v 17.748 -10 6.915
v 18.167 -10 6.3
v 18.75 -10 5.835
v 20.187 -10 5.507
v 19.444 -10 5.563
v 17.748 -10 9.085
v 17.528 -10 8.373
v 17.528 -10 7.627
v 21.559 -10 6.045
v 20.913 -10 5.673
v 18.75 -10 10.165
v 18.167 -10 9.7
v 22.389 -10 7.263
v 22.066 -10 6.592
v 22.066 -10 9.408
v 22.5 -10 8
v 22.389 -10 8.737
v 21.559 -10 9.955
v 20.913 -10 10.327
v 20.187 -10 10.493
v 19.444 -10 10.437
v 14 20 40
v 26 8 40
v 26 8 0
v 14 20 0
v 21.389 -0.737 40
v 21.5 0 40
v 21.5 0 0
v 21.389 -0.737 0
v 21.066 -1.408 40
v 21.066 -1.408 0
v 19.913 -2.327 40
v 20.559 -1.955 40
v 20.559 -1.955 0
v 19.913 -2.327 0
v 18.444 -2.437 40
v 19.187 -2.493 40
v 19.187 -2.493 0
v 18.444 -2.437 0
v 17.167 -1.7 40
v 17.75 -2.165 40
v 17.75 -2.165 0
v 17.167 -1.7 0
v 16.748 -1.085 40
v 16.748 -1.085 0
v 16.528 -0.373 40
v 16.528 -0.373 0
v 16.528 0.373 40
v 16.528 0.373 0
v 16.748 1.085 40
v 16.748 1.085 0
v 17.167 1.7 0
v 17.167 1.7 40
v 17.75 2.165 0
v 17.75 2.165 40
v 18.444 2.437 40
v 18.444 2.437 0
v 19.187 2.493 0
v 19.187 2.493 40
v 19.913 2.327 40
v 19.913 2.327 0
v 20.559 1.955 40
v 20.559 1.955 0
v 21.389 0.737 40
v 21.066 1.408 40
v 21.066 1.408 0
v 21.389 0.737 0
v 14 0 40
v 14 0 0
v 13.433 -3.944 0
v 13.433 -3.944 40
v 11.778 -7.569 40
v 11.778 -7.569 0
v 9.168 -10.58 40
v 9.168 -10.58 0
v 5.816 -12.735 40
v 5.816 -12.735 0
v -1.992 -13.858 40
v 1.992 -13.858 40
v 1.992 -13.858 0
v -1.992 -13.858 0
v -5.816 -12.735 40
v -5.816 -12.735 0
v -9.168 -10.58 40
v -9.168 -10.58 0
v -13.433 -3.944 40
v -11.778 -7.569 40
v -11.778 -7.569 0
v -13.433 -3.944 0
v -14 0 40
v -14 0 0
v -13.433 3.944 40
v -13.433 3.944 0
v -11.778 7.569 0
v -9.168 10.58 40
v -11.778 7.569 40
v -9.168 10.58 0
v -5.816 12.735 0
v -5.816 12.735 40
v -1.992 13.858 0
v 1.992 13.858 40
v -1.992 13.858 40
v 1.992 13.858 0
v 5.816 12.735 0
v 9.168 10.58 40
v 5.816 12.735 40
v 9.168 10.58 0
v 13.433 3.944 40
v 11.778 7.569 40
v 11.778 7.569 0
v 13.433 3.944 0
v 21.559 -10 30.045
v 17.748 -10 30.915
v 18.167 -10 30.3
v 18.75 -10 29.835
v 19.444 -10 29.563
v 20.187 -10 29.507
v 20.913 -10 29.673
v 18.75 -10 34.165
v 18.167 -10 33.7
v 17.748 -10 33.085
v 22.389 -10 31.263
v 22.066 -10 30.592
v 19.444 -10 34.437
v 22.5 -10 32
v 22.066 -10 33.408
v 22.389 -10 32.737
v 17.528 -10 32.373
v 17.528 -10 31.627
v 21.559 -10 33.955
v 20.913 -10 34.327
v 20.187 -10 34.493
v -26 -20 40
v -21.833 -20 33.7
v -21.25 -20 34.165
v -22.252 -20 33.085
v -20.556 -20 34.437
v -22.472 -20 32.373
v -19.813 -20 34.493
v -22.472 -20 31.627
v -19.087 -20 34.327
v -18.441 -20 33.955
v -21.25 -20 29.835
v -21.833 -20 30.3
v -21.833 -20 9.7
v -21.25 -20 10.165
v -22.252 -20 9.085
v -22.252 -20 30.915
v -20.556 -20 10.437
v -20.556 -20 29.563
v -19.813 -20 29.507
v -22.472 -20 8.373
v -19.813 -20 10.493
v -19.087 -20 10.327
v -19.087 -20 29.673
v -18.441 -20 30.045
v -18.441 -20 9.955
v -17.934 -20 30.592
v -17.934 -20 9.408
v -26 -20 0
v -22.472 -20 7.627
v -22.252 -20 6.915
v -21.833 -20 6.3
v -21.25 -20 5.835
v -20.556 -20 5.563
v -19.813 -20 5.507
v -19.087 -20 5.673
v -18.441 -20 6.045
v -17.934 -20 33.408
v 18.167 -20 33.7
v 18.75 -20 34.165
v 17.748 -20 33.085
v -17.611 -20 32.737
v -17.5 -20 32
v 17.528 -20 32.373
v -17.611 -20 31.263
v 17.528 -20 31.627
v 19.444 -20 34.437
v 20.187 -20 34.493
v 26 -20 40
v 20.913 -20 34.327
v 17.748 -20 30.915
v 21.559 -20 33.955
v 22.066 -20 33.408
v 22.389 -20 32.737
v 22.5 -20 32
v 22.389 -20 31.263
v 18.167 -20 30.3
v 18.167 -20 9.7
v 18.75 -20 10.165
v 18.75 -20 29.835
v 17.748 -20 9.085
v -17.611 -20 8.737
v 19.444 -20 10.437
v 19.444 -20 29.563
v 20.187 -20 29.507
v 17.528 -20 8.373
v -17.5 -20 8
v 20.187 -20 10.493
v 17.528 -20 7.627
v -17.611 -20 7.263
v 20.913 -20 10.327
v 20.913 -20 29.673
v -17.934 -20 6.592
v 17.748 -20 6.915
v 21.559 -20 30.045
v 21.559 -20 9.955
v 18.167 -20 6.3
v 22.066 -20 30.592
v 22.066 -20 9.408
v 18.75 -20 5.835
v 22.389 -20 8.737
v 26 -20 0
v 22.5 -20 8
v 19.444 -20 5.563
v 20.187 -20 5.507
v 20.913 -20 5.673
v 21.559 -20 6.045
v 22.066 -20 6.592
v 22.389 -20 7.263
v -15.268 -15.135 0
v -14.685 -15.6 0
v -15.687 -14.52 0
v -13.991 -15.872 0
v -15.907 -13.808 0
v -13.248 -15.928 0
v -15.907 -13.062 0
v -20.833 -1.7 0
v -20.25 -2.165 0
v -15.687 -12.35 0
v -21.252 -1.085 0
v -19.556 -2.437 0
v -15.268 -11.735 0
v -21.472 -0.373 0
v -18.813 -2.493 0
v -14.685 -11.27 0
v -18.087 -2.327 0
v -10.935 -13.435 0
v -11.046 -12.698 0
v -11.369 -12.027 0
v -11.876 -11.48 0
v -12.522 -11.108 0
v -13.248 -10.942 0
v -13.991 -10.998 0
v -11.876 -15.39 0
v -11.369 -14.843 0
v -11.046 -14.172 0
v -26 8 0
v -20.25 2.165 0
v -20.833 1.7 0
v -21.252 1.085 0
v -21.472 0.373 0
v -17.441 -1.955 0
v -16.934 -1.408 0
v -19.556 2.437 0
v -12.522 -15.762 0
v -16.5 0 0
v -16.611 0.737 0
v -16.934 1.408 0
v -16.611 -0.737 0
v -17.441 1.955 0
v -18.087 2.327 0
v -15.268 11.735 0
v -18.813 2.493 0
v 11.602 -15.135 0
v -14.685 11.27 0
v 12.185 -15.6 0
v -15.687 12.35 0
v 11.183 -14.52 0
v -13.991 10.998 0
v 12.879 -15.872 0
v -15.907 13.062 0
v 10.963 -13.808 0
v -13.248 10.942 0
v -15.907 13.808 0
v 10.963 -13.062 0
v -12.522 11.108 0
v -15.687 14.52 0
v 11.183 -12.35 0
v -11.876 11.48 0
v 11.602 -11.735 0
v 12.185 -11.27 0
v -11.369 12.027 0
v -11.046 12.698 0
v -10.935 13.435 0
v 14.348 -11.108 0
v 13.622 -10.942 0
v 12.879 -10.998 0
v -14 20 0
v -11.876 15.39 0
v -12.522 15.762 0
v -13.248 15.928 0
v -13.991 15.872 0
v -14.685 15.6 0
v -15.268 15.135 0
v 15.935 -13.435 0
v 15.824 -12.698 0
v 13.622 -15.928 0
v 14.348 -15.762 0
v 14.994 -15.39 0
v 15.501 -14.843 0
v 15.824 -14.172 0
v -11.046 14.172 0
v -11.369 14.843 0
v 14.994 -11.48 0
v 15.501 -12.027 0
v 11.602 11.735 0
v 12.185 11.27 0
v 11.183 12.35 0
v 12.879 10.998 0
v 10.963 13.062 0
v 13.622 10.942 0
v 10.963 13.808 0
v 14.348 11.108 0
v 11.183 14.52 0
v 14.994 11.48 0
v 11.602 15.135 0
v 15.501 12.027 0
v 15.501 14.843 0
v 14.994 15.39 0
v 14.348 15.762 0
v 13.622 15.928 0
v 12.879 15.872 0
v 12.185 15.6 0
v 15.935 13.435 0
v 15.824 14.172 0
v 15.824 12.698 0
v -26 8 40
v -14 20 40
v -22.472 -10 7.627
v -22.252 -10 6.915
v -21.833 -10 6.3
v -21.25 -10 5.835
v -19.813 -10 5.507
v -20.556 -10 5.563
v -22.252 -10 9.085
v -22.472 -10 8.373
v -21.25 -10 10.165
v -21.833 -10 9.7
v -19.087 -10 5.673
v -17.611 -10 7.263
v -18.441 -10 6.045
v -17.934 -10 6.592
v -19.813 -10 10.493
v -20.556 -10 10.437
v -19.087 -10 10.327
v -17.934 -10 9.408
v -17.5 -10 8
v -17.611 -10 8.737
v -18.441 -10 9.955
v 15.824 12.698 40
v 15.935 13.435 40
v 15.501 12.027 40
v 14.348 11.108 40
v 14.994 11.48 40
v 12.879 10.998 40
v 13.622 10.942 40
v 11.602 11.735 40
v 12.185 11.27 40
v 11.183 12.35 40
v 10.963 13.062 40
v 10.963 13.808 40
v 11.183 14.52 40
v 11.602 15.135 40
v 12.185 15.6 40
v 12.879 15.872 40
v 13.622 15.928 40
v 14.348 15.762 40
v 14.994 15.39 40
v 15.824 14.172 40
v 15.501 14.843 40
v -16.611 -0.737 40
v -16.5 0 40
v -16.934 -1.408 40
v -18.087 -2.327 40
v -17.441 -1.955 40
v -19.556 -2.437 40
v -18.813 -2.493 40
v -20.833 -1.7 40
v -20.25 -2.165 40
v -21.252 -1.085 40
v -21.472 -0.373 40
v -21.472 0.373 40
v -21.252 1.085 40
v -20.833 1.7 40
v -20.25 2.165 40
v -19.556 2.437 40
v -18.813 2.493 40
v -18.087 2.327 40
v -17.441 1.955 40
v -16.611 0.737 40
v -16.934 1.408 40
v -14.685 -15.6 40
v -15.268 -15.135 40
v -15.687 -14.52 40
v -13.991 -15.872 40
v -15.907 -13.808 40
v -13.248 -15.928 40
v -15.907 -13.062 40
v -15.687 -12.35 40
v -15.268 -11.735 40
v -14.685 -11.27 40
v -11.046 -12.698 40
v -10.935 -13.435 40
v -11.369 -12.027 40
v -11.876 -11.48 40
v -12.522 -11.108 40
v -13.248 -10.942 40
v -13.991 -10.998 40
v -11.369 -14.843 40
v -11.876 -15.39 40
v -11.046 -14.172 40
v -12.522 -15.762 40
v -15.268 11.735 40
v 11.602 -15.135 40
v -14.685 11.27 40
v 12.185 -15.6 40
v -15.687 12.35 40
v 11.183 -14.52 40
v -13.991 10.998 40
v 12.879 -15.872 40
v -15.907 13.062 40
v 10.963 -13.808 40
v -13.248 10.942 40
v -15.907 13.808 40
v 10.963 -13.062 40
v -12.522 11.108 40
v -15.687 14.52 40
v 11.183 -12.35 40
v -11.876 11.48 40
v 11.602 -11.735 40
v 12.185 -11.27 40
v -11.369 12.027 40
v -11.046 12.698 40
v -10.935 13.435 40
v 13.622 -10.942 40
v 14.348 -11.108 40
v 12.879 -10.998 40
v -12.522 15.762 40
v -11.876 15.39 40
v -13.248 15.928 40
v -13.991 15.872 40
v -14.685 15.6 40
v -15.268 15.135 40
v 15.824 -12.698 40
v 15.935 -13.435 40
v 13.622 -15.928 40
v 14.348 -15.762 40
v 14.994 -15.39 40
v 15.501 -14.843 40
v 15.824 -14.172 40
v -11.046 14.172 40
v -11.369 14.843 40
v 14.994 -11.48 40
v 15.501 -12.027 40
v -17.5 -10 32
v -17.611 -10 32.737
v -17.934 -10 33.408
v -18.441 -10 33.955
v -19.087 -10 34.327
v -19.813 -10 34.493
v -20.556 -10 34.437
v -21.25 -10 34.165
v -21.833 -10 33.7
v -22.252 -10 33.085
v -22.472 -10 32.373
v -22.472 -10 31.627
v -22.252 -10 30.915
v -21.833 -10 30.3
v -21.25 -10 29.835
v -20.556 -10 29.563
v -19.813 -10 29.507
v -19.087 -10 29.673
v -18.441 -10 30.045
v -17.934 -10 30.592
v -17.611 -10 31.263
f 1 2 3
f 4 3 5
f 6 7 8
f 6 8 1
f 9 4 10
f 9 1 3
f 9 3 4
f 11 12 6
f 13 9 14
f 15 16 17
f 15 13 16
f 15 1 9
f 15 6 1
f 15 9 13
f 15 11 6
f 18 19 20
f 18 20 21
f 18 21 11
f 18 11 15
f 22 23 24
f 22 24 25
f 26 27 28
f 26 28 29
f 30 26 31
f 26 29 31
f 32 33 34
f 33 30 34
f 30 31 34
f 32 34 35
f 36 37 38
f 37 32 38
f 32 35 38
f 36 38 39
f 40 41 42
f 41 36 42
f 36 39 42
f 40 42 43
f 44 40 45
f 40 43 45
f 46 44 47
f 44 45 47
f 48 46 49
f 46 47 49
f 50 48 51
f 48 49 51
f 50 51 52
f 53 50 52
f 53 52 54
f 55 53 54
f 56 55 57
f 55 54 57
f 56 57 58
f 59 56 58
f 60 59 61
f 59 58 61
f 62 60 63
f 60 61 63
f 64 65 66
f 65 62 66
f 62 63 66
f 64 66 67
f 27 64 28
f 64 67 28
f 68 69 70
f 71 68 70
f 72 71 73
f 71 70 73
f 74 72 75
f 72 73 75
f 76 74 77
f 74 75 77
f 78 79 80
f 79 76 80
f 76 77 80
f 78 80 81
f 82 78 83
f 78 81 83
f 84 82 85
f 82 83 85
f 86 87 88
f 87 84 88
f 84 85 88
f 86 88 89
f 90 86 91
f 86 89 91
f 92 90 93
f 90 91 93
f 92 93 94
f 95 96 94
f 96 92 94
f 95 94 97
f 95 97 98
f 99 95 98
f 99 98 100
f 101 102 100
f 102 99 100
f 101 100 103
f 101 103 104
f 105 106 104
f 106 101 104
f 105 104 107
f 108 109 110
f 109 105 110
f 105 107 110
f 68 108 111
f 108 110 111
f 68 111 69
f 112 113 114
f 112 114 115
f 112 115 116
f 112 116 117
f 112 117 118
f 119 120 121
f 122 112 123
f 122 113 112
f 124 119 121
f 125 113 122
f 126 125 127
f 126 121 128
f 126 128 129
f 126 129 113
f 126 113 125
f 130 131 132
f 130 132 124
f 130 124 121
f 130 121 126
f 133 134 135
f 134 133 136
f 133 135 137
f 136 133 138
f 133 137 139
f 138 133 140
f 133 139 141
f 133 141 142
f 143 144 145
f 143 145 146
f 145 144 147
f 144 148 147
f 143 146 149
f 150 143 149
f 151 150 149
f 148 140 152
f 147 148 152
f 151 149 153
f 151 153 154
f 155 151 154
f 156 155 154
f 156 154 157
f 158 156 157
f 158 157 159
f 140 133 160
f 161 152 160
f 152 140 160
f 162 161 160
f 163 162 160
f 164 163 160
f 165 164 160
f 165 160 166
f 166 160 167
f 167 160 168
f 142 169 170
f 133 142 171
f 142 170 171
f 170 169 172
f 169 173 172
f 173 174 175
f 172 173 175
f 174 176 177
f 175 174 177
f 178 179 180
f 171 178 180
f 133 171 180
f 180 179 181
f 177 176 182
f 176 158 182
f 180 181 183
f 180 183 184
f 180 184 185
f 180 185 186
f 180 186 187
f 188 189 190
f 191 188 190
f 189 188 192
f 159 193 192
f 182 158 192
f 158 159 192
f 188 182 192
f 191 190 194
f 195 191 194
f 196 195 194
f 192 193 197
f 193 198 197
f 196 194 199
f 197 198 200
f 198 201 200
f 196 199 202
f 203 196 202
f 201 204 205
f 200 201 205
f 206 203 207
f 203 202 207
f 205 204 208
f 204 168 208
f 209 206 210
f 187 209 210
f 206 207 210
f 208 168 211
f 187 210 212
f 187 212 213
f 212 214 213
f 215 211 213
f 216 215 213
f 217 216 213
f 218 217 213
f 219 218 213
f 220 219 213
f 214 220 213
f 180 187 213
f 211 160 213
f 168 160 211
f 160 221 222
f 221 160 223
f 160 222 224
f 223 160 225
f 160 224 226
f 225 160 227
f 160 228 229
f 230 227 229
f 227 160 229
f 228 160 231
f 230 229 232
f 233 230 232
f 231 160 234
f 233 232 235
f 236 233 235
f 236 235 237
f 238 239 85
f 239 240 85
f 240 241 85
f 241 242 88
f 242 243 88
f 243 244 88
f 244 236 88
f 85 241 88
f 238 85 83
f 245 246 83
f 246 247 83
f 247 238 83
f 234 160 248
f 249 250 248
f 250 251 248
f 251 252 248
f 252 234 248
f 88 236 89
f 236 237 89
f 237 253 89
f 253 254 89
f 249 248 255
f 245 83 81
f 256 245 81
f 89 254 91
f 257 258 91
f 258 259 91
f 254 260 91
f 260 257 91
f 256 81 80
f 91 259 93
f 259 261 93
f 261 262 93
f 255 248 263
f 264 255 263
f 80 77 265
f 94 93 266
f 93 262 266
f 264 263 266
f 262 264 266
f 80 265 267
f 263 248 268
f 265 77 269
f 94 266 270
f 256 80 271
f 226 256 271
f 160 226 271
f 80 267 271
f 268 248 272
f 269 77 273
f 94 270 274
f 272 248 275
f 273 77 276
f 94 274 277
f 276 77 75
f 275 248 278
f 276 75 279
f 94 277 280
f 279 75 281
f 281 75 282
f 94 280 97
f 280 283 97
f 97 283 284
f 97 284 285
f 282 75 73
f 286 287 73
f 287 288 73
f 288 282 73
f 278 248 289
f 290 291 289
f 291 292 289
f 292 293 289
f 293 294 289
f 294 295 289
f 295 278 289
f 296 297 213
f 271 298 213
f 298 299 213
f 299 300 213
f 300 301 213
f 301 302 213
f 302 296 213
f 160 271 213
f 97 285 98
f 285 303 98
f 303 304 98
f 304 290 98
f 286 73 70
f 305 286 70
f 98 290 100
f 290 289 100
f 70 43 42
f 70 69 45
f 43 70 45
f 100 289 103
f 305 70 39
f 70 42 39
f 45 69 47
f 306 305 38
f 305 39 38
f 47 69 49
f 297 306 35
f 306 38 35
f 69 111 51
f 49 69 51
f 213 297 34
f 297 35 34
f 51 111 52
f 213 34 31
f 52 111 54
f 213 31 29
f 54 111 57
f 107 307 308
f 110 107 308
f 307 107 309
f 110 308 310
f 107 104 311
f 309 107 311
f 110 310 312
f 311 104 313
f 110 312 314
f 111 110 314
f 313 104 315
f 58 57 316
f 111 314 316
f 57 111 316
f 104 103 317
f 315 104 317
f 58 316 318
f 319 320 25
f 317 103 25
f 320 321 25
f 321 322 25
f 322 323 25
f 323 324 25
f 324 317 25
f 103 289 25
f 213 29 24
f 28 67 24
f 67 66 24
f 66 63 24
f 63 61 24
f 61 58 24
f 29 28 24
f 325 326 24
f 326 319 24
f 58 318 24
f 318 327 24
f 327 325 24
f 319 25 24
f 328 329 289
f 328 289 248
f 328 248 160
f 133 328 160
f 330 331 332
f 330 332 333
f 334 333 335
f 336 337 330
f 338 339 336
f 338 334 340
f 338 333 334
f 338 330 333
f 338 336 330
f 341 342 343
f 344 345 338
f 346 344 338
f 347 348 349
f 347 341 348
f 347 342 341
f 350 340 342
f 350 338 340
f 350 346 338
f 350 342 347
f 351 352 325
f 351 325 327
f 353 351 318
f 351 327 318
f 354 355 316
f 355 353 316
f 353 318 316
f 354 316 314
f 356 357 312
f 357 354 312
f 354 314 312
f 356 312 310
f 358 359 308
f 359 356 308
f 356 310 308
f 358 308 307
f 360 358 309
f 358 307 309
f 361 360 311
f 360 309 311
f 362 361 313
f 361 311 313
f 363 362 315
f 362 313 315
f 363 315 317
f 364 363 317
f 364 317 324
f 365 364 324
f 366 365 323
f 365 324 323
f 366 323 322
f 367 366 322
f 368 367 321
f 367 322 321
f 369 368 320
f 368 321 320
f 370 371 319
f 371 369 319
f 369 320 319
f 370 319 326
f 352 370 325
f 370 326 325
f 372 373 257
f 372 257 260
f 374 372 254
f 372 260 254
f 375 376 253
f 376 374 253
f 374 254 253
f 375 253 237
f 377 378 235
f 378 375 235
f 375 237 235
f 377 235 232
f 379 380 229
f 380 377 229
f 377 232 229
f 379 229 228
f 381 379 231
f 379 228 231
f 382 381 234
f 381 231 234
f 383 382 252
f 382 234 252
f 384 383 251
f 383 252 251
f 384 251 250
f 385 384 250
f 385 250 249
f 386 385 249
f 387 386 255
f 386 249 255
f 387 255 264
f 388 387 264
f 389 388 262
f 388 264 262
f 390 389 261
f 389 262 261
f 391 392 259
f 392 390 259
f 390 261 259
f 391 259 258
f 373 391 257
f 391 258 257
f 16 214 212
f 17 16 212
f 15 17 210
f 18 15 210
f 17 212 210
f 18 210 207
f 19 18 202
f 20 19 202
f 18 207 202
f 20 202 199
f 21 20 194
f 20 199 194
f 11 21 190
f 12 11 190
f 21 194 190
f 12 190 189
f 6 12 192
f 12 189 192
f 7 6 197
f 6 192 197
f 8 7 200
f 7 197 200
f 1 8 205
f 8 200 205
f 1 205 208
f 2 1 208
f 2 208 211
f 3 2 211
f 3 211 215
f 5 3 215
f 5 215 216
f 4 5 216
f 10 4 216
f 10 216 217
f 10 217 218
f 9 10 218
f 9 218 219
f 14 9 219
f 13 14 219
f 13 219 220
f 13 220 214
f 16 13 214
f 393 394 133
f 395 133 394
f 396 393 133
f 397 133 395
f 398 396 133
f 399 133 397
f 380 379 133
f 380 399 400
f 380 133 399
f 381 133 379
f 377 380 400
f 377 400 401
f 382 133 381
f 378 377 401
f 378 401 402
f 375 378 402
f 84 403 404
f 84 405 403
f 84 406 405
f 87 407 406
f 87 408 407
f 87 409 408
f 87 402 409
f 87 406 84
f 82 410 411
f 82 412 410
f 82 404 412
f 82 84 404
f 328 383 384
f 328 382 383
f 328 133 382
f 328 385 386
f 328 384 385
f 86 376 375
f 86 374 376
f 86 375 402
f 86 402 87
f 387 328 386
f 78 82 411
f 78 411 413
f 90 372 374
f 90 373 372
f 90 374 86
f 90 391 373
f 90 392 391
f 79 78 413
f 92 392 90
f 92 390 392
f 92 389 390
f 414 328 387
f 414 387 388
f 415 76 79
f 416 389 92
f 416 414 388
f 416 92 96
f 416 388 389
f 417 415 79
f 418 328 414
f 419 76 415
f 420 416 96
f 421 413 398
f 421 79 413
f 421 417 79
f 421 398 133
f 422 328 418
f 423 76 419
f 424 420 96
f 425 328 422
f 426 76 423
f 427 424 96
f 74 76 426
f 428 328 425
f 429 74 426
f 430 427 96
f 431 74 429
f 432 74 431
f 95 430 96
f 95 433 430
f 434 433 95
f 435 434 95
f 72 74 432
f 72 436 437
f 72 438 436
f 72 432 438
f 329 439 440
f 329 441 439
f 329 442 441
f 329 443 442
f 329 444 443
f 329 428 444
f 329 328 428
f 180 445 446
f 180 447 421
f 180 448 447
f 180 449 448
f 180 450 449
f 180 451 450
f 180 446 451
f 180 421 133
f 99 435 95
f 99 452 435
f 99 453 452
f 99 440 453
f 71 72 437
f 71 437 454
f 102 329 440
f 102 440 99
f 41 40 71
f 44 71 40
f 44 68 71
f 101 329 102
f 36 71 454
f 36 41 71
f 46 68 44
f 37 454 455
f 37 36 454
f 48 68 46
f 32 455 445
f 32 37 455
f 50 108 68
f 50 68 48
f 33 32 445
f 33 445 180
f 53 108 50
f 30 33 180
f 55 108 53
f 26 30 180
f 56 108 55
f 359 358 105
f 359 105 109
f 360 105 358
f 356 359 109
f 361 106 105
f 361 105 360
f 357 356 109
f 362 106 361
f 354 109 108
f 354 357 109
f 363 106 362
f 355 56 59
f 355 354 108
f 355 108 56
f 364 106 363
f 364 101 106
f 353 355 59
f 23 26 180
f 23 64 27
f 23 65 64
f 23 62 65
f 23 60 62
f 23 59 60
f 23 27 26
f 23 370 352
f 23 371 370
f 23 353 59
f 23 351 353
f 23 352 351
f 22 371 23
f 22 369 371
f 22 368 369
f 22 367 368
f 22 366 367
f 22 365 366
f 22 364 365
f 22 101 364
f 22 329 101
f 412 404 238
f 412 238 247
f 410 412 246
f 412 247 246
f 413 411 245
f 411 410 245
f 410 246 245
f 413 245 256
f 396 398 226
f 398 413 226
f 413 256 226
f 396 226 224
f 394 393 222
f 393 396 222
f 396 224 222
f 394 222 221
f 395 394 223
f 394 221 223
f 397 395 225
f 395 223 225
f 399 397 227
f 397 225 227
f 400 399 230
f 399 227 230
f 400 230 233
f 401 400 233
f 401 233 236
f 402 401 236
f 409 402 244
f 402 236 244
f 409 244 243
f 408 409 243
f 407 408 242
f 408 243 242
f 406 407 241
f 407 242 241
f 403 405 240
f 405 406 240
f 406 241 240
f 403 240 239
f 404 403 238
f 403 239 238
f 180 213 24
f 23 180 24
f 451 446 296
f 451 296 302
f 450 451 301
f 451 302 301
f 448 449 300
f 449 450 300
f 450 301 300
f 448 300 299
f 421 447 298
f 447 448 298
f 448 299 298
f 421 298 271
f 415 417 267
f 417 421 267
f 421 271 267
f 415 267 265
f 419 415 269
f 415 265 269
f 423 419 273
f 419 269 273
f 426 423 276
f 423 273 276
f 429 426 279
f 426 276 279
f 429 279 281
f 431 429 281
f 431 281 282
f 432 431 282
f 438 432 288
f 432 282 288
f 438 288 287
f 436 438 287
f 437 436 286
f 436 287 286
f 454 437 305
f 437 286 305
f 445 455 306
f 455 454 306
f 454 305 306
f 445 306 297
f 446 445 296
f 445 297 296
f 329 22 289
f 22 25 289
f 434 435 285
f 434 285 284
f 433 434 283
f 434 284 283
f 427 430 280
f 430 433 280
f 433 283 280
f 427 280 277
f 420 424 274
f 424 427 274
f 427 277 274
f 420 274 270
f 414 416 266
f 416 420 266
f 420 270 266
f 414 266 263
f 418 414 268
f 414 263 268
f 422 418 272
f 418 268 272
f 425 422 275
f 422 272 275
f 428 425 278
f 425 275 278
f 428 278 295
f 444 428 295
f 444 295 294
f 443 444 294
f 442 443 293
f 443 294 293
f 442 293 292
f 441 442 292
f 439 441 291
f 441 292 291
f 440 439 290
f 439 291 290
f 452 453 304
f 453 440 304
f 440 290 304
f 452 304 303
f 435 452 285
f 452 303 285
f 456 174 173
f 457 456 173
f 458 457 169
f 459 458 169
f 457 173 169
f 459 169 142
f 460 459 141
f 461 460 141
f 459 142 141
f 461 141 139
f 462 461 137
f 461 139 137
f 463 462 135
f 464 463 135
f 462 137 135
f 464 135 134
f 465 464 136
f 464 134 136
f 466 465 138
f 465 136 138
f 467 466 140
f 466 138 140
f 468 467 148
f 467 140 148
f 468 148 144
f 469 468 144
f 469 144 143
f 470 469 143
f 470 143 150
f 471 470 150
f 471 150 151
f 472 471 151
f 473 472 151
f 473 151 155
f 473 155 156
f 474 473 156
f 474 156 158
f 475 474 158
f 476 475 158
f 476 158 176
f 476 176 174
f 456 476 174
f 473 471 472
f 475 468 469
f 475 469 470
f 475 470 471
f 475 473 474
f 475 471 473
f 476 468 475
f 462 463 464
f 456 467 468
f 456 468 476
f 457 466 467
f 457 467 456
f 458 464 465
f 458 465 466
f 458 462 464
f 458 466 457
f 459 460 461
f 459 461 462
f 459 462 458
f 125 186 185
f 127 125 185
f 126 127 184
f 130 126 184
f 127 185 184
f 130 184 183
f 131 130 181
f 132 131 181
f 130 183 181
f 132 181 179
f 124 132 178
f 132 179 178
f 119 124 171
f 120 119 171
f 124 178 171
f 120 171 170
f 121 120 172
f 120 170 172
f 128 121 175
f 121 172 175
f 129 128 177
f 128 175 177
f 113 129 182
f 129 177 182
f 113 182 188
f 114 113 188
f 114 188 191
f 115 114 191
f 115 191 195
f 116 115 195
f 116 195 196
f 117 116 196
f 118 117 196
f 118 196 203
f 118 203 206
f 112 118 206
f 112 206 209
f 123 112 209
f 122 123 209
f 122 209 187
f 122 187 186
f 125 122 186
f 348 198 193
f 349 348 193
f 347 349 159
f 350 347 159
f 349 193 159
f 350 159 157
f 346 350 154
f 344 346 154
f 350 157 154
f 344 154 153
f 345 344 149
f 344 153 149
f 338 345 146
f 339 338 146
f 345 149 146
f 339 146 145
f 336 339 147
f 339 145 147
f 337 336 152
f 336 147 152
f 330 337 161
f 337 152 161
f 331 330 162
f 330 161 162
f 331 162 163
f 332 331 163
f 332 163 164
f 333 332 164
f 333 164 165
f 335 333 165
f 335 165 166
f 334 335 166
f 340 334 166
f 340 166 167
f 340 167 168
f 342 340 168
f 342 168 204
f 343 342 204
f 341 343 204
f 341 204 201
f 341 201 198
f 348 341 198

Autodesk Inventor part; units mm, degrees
ref_plane "YZ Plane" through (0, 0, 0) normal (1, 0, 0) x (0, 1, 0)
ref_plane "XZ Plane" through (0, 0, 0) normal (0, 1, 0) x (-1, 0, 0)
ref_plane "XY Plane" through (0, 0, 0) normal (0, 0, 1) x (1, 0, 0)
sketch "Sketch1" plane through (0, 0, 0) normal (0, 0, 1) x (1, 0, 0)
  circle A0 centre (0, 0) radius 14
  line L0 (-26, -20) -> (26, -20)
  line L1 (26, -20) -> (26, 8)
  line L2 (26, 8) -> (14, 20)
  line L3 (14, 20) -> (-14, 20)
  line L4 (-14, 20) -> (-26, 8)
  line L5 (-26, 8) -> (-26, -20)
  circle A1 centre (0, 0) radius 19 construction
  circle A2 centre (13.435, 13.435) radius 2.5
  circle A3 centre (-13.435, -13.435) radius 2.5
  circle A4 centre (13.435, -13.435) radius 2.5
  circle A5 centre (-13.435, 13.435) radius 2.5
  circle A6 centre (-19, 0) radius 2.5
  circle A7 centre (19, 0) radius 2.5
  line L6 (-13.435, 13.435) -> (0, 0) construction
  line L7 (0, 0) -> (-19, 0) construction
  point P0 (0, 20)
  point P1 (0, -20)
  dimension "d0" = 28
  dimension "d1" = 40
  dimension "d2" = 52
  dimension "d3" = 38
  dimension "d4" = 5
  dimension "d5" = 45
  dimension "d6" = 20
  dimension "d7" = 135
  dimension "d8" = 12
extrude "Extrusion1" add sketch "Sketch1" along normal blind 40
sketch "Sketch2" plane through (-26, -20, 0) normal (0, -1, 0) x (1, 0, 0)
  circle A0 centre (6, 32) radius 2.5
  circle A1 centre (46, 32) radius 2.5
  circle A2 centre (6, 8) radius 2.5
  circle A3 centre (46, 8) radius 2.5
  line L0 (6, 32) -> (46, 32) construction
  line L1 (46, 32) -> (46, 8) construction
  line L2 (46, 8) -> (6, 8) construction
  line L3 (6, 8) -> (6, 32) construction
  line L4 (0, 40) -> (52, 40) construction
  line L5 (52, 0) -> (52, 40) construction
  point P0 (26, 0)
  point P1 (26, 32)
  point P2 (26, 40)
  point P3 (46, 20)
  point P4 (52, 20)
  dimension "d11" = 5
  dimension "d12" = 40
  dimension "d13" = 24
extrude "Extrusion2" cut sketch "Sketch2" against normal blind 10
properties part number "DSG16H"
